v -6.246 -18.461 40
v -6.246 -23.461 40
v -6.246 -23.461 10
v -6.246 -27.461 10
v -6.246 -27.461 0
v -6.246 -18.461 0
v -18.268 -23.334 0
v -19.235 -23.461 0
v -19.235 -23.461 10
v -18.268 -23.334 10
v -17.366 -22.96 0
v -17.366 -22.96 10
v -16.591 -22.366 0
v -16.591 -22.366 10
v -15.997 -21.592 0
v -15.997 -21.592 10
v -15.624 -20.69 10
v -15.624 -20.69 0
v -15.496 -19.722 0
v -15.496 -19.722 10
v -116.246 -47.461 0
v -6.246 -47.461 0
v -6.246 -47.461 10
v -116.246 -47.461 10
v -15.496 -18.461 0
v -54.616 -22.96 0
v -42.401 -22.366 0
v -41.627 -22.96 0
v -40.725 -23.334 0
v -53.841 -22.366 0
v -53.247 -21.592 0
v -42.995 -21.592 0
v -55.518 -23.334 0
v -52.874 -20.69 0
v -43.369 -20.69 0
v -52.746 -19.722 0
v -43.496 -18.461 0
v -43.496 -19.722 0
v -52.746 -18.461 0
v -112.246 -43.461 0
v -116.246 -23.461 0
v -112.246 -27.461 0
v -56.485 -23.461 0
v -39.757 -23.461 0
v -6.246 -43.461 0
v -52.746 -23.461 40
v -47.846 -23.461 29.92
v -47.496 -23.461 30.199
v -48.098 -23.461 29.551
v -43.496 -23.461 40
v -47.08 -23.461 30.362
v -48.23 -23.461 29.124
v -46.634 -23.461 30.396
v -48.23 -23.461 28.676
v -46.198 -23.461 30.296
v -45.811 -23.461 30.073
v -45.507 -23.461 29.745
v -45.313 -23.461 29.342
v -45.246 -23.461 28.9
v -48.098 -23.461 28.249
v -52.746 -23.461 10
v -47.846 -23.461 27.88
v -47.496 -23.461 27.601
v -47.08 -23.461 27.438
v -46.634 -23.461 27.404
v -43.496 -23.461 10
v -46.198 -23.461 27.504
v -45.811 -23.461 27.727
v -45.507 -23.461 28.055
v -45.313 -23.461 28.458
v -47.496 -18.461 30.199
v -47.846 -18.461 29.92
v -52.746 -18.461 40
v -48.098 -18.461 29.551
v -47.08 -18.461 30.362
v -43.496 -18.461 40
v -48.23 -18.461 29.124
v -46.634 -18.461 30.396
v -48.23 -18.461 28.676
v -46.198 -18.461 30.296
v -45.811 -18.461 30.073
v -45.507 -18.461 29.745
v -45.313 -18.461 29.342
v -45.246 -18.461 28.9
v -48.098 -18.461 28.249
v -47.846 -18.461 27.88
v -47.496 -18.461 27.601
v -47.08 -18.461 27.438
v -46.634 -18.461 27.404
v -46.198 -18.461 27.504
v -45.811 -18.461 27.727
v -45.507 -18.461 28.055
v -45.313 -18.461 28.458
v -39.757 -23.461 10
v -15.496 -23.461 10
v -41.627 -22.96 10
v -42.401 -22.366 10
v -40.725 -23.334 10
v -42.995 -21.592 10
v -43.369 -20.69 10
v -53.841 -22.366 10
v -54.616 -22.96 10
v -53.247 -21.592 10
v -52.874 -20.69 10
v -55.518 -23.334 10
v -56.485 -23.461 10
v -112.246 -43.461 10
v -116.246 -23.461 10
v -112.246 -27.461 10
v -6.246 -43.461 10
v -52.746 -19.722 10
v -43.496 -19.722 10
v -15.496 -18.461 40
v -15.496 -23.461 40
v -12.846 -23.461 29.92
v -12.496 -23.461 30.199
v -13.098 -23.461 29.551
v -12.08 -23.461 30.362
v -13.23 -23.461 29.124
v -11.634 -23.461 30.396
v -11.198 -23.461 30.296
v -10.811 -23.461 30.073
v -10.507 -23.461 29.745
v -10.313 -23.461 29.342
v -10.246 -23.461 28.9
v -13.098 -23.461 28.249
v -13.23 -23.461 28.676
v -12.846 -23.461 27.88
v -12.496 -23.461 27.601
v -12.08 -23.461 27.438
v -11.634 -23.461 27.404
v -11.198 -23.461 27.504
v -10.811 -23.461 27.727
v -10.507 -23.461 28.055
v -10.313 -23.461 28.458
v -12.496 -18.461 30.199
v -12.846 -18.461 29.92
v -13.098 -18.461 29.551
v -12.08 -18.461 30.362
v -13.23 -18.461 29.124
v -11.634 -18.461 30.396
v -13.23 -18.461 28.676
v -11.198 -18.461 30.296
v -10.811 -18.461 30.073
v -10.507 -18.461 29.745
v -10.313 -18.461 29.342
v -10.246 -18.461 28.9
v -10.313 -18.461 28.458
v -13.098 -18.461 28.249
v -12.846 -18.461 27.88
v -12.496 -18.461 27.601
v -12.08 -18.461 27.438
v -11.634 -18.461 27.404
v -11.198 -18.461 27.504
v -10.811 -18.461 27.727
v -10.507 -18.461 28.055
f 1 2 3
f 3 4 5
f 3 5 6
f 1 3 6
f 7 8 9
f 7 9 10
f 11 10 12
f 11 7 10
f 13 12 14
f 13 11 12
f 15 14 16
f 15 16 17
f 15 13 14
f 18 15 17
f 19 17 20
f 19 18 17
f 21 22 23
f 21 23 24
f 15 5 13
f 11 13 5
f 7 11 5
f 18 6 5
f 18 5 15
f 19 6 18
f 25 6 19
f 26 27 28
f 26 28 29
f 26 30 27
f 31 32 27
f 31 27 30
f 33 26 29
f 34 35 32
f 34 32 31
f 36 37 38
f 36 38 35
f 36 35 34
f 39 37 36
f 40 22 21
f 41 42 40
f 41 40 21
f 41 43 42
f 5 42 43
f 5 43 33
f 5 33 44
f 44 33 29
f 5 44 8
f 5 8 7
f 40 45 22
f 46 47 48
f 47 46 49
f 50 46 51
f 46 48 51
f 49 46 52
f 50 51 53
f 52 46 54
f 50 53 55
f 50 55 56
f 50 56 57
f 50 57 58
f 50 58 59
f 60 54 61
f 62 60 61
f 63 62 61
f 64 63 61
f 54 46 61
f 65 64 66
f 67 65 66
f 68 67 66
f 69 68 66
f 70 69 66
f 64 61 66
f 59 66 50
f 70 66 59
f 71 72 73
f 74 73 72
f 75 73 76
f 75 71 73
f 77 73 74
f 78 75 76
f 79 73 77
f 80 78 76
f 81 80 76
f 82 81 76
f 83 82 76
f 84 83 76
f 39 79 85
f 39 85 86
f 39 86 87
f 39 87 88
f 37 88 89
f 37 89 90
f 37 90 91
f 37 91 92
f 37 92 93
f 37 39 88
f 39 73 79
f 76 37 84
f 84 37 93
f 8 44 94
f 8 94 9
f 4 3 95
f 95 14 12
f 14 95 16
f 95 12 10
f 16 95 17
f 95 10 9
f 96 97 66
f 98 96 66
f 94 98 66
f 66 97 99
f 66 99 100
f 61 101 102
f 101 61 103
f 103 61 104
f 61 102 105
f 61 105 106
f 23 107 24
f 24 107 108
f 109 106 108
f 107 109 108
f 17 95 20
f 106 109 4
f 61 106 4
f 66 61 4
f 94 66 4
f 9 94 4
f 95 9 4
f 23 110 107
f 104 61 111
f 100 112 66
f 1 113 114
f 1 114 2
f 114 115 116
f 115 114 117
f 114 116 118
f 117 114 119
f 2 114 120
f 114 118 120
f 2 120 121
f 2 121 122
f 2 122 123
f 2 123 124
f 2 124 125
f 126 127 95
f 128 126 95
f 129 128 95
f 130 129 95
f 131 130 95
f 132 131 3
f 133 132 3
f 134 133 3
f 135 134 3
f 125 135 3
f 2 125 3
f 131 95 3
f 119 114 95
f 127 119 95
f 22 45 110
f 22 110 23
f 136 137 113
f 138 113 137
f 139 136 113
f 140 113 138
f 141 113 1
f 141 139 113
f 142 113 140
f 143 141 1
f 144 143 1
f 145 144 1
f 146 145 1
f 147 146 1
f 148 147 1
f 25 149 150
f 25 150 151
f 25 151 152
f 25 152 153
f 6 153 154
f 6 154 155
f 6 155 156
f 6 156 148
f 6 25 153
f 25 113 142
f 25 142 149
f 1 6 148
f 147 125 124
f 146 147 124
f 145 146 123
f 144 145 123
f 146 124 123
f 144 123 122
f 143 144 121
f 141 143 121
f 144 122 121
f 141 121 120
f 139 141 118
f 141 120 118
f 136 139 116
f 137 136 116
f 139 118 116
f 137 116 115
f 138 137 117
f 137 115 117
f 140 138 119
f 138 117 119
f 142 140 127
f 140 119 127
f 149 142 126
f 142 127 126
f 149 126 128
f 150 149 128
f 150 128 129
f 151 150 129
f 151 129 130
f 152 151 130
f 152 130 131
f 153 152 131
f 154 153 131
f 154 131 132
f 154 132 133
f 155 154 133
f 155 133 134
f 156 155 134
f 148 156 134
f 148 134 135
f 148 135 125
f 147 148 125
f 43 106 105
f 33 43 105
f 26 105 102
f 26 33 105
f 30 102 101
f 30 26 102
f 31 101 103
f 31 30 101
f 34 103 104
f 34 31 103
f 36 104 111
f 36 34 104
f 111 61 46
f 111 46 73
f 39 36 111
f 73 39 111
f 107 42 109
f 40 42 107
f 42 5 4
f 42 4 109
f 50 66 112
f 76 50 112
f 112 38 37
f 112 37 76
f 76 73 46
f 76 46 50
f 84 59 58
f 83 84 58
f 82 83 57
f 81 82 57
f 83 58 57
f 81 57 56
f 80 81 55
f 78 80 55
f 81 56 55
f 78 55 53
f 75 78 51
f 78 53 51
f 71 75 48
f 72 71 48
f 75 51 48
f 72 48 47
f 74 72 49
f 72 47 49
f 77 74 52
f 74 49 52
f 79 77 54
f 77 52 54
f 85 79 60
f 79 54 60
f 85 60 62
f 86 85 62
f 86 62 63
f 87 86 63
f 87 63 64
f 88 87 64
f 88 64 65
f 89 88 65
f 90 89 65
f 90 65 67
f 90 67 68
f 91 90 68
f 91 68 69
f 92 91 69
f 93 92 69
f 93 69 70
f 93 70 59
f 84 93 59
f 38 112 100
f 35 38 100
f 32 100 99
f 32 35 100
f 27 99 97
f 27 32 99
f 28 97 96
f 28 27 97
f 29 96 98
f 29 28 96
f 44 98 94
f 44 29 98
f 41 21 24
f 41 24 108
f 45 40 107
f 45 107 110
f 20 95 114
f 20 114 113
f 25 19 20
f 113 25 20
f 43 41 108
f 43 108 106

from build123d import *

# Parameters (mm, degrees)
PAD001_DEPTH    = 10
SKETCH005_W     = 9.25
SKETCH005_H     = 5
PAD002_DEPTH    = 30
SKETCH006_R     = 1.5
POCKET001_DEPTH = 11


with BuildPart() as part:
    # Sketch002 → Pad001 (new body)
    with BuildSketch(Plane.XY):
        with BuildLine():
            Line((-39.757408, -23.461055), (-19.235308, -23.461055))
            ThreePointArc((-19.235308, -23.461055), (-16.591471, -22.365942), (-15.496358, -19.722105))
            Line((-15.496358, -19.722105), (-15.496358, -18.461055))
            Line((-15.496358, -18.461055), (-6.246358, -18.461055))
            Line((-6.246358, -18.461055), (-6.246358, -27.461055))
            Line((-6.246358, -27.461055), (-112.246358, -27.461055))
            Line((-112.246358, -27.461055), (-112.246358, -43.461055))
            Line((-112.246358, -43.461055), (-6.246358, -43.461055))
            Line((-6.246358, -43.461055), (-6.246358, -47.461055))
            Line((-6.246358, -47.461055), (-116.246358, -47.461055))
            Line((-116.246358, -47.461055), (-116.246358, -23.461055))
            Line((-116.246358, -23.461055), (-56.485308, -23.461055))
            ThreePointArc((-56.485308, -23.461055), (-53.841471, -22.365942), (-52.746358, -19.722105))
            Line((-52.746358, -19.722105), (-52.746358, -18.461055))
            Line((-52.746358, -18.461055), (-43.496358, -18.461055))
            Line((-43.496358, -18.461055), (-43.496358, -19.722105))
            ThreePointArc((-43.496358, -19.722105), (-42.401245, -22.365942), (-39.757408, -23.461055))
        make_face()
    extrude(amount=PAD001_DEPTH)

    # Sketch005 → Pad002 (new body)
    with BuildSketch(Plane.XY.offset(10)):
        with Locations((-10.871358, -20.961055)):
            Rectangle(SKETCH005_W, SKETCH005_H)
        with Locations((-48.121358, -20.961055)):
            Rectangle(SKETCH005_W, SKETCH005_H)
    extrude(amount=PAD002_DEPTH)

    # Sketch006 → Pocket001 (cut)
    with BuildSketch(Plane.XZ.offset(23.461055)):
        with Locations((-46.746358, 28.9)):
            Circle(SKETCH006_R)
        with Locations((-11.746358, 28.9)):
            Circle(SKETCH006_R)
    extrude(amount=-POCKET001_DEPTH, mode=Mode.SUBTRACT)


solid = part.part
